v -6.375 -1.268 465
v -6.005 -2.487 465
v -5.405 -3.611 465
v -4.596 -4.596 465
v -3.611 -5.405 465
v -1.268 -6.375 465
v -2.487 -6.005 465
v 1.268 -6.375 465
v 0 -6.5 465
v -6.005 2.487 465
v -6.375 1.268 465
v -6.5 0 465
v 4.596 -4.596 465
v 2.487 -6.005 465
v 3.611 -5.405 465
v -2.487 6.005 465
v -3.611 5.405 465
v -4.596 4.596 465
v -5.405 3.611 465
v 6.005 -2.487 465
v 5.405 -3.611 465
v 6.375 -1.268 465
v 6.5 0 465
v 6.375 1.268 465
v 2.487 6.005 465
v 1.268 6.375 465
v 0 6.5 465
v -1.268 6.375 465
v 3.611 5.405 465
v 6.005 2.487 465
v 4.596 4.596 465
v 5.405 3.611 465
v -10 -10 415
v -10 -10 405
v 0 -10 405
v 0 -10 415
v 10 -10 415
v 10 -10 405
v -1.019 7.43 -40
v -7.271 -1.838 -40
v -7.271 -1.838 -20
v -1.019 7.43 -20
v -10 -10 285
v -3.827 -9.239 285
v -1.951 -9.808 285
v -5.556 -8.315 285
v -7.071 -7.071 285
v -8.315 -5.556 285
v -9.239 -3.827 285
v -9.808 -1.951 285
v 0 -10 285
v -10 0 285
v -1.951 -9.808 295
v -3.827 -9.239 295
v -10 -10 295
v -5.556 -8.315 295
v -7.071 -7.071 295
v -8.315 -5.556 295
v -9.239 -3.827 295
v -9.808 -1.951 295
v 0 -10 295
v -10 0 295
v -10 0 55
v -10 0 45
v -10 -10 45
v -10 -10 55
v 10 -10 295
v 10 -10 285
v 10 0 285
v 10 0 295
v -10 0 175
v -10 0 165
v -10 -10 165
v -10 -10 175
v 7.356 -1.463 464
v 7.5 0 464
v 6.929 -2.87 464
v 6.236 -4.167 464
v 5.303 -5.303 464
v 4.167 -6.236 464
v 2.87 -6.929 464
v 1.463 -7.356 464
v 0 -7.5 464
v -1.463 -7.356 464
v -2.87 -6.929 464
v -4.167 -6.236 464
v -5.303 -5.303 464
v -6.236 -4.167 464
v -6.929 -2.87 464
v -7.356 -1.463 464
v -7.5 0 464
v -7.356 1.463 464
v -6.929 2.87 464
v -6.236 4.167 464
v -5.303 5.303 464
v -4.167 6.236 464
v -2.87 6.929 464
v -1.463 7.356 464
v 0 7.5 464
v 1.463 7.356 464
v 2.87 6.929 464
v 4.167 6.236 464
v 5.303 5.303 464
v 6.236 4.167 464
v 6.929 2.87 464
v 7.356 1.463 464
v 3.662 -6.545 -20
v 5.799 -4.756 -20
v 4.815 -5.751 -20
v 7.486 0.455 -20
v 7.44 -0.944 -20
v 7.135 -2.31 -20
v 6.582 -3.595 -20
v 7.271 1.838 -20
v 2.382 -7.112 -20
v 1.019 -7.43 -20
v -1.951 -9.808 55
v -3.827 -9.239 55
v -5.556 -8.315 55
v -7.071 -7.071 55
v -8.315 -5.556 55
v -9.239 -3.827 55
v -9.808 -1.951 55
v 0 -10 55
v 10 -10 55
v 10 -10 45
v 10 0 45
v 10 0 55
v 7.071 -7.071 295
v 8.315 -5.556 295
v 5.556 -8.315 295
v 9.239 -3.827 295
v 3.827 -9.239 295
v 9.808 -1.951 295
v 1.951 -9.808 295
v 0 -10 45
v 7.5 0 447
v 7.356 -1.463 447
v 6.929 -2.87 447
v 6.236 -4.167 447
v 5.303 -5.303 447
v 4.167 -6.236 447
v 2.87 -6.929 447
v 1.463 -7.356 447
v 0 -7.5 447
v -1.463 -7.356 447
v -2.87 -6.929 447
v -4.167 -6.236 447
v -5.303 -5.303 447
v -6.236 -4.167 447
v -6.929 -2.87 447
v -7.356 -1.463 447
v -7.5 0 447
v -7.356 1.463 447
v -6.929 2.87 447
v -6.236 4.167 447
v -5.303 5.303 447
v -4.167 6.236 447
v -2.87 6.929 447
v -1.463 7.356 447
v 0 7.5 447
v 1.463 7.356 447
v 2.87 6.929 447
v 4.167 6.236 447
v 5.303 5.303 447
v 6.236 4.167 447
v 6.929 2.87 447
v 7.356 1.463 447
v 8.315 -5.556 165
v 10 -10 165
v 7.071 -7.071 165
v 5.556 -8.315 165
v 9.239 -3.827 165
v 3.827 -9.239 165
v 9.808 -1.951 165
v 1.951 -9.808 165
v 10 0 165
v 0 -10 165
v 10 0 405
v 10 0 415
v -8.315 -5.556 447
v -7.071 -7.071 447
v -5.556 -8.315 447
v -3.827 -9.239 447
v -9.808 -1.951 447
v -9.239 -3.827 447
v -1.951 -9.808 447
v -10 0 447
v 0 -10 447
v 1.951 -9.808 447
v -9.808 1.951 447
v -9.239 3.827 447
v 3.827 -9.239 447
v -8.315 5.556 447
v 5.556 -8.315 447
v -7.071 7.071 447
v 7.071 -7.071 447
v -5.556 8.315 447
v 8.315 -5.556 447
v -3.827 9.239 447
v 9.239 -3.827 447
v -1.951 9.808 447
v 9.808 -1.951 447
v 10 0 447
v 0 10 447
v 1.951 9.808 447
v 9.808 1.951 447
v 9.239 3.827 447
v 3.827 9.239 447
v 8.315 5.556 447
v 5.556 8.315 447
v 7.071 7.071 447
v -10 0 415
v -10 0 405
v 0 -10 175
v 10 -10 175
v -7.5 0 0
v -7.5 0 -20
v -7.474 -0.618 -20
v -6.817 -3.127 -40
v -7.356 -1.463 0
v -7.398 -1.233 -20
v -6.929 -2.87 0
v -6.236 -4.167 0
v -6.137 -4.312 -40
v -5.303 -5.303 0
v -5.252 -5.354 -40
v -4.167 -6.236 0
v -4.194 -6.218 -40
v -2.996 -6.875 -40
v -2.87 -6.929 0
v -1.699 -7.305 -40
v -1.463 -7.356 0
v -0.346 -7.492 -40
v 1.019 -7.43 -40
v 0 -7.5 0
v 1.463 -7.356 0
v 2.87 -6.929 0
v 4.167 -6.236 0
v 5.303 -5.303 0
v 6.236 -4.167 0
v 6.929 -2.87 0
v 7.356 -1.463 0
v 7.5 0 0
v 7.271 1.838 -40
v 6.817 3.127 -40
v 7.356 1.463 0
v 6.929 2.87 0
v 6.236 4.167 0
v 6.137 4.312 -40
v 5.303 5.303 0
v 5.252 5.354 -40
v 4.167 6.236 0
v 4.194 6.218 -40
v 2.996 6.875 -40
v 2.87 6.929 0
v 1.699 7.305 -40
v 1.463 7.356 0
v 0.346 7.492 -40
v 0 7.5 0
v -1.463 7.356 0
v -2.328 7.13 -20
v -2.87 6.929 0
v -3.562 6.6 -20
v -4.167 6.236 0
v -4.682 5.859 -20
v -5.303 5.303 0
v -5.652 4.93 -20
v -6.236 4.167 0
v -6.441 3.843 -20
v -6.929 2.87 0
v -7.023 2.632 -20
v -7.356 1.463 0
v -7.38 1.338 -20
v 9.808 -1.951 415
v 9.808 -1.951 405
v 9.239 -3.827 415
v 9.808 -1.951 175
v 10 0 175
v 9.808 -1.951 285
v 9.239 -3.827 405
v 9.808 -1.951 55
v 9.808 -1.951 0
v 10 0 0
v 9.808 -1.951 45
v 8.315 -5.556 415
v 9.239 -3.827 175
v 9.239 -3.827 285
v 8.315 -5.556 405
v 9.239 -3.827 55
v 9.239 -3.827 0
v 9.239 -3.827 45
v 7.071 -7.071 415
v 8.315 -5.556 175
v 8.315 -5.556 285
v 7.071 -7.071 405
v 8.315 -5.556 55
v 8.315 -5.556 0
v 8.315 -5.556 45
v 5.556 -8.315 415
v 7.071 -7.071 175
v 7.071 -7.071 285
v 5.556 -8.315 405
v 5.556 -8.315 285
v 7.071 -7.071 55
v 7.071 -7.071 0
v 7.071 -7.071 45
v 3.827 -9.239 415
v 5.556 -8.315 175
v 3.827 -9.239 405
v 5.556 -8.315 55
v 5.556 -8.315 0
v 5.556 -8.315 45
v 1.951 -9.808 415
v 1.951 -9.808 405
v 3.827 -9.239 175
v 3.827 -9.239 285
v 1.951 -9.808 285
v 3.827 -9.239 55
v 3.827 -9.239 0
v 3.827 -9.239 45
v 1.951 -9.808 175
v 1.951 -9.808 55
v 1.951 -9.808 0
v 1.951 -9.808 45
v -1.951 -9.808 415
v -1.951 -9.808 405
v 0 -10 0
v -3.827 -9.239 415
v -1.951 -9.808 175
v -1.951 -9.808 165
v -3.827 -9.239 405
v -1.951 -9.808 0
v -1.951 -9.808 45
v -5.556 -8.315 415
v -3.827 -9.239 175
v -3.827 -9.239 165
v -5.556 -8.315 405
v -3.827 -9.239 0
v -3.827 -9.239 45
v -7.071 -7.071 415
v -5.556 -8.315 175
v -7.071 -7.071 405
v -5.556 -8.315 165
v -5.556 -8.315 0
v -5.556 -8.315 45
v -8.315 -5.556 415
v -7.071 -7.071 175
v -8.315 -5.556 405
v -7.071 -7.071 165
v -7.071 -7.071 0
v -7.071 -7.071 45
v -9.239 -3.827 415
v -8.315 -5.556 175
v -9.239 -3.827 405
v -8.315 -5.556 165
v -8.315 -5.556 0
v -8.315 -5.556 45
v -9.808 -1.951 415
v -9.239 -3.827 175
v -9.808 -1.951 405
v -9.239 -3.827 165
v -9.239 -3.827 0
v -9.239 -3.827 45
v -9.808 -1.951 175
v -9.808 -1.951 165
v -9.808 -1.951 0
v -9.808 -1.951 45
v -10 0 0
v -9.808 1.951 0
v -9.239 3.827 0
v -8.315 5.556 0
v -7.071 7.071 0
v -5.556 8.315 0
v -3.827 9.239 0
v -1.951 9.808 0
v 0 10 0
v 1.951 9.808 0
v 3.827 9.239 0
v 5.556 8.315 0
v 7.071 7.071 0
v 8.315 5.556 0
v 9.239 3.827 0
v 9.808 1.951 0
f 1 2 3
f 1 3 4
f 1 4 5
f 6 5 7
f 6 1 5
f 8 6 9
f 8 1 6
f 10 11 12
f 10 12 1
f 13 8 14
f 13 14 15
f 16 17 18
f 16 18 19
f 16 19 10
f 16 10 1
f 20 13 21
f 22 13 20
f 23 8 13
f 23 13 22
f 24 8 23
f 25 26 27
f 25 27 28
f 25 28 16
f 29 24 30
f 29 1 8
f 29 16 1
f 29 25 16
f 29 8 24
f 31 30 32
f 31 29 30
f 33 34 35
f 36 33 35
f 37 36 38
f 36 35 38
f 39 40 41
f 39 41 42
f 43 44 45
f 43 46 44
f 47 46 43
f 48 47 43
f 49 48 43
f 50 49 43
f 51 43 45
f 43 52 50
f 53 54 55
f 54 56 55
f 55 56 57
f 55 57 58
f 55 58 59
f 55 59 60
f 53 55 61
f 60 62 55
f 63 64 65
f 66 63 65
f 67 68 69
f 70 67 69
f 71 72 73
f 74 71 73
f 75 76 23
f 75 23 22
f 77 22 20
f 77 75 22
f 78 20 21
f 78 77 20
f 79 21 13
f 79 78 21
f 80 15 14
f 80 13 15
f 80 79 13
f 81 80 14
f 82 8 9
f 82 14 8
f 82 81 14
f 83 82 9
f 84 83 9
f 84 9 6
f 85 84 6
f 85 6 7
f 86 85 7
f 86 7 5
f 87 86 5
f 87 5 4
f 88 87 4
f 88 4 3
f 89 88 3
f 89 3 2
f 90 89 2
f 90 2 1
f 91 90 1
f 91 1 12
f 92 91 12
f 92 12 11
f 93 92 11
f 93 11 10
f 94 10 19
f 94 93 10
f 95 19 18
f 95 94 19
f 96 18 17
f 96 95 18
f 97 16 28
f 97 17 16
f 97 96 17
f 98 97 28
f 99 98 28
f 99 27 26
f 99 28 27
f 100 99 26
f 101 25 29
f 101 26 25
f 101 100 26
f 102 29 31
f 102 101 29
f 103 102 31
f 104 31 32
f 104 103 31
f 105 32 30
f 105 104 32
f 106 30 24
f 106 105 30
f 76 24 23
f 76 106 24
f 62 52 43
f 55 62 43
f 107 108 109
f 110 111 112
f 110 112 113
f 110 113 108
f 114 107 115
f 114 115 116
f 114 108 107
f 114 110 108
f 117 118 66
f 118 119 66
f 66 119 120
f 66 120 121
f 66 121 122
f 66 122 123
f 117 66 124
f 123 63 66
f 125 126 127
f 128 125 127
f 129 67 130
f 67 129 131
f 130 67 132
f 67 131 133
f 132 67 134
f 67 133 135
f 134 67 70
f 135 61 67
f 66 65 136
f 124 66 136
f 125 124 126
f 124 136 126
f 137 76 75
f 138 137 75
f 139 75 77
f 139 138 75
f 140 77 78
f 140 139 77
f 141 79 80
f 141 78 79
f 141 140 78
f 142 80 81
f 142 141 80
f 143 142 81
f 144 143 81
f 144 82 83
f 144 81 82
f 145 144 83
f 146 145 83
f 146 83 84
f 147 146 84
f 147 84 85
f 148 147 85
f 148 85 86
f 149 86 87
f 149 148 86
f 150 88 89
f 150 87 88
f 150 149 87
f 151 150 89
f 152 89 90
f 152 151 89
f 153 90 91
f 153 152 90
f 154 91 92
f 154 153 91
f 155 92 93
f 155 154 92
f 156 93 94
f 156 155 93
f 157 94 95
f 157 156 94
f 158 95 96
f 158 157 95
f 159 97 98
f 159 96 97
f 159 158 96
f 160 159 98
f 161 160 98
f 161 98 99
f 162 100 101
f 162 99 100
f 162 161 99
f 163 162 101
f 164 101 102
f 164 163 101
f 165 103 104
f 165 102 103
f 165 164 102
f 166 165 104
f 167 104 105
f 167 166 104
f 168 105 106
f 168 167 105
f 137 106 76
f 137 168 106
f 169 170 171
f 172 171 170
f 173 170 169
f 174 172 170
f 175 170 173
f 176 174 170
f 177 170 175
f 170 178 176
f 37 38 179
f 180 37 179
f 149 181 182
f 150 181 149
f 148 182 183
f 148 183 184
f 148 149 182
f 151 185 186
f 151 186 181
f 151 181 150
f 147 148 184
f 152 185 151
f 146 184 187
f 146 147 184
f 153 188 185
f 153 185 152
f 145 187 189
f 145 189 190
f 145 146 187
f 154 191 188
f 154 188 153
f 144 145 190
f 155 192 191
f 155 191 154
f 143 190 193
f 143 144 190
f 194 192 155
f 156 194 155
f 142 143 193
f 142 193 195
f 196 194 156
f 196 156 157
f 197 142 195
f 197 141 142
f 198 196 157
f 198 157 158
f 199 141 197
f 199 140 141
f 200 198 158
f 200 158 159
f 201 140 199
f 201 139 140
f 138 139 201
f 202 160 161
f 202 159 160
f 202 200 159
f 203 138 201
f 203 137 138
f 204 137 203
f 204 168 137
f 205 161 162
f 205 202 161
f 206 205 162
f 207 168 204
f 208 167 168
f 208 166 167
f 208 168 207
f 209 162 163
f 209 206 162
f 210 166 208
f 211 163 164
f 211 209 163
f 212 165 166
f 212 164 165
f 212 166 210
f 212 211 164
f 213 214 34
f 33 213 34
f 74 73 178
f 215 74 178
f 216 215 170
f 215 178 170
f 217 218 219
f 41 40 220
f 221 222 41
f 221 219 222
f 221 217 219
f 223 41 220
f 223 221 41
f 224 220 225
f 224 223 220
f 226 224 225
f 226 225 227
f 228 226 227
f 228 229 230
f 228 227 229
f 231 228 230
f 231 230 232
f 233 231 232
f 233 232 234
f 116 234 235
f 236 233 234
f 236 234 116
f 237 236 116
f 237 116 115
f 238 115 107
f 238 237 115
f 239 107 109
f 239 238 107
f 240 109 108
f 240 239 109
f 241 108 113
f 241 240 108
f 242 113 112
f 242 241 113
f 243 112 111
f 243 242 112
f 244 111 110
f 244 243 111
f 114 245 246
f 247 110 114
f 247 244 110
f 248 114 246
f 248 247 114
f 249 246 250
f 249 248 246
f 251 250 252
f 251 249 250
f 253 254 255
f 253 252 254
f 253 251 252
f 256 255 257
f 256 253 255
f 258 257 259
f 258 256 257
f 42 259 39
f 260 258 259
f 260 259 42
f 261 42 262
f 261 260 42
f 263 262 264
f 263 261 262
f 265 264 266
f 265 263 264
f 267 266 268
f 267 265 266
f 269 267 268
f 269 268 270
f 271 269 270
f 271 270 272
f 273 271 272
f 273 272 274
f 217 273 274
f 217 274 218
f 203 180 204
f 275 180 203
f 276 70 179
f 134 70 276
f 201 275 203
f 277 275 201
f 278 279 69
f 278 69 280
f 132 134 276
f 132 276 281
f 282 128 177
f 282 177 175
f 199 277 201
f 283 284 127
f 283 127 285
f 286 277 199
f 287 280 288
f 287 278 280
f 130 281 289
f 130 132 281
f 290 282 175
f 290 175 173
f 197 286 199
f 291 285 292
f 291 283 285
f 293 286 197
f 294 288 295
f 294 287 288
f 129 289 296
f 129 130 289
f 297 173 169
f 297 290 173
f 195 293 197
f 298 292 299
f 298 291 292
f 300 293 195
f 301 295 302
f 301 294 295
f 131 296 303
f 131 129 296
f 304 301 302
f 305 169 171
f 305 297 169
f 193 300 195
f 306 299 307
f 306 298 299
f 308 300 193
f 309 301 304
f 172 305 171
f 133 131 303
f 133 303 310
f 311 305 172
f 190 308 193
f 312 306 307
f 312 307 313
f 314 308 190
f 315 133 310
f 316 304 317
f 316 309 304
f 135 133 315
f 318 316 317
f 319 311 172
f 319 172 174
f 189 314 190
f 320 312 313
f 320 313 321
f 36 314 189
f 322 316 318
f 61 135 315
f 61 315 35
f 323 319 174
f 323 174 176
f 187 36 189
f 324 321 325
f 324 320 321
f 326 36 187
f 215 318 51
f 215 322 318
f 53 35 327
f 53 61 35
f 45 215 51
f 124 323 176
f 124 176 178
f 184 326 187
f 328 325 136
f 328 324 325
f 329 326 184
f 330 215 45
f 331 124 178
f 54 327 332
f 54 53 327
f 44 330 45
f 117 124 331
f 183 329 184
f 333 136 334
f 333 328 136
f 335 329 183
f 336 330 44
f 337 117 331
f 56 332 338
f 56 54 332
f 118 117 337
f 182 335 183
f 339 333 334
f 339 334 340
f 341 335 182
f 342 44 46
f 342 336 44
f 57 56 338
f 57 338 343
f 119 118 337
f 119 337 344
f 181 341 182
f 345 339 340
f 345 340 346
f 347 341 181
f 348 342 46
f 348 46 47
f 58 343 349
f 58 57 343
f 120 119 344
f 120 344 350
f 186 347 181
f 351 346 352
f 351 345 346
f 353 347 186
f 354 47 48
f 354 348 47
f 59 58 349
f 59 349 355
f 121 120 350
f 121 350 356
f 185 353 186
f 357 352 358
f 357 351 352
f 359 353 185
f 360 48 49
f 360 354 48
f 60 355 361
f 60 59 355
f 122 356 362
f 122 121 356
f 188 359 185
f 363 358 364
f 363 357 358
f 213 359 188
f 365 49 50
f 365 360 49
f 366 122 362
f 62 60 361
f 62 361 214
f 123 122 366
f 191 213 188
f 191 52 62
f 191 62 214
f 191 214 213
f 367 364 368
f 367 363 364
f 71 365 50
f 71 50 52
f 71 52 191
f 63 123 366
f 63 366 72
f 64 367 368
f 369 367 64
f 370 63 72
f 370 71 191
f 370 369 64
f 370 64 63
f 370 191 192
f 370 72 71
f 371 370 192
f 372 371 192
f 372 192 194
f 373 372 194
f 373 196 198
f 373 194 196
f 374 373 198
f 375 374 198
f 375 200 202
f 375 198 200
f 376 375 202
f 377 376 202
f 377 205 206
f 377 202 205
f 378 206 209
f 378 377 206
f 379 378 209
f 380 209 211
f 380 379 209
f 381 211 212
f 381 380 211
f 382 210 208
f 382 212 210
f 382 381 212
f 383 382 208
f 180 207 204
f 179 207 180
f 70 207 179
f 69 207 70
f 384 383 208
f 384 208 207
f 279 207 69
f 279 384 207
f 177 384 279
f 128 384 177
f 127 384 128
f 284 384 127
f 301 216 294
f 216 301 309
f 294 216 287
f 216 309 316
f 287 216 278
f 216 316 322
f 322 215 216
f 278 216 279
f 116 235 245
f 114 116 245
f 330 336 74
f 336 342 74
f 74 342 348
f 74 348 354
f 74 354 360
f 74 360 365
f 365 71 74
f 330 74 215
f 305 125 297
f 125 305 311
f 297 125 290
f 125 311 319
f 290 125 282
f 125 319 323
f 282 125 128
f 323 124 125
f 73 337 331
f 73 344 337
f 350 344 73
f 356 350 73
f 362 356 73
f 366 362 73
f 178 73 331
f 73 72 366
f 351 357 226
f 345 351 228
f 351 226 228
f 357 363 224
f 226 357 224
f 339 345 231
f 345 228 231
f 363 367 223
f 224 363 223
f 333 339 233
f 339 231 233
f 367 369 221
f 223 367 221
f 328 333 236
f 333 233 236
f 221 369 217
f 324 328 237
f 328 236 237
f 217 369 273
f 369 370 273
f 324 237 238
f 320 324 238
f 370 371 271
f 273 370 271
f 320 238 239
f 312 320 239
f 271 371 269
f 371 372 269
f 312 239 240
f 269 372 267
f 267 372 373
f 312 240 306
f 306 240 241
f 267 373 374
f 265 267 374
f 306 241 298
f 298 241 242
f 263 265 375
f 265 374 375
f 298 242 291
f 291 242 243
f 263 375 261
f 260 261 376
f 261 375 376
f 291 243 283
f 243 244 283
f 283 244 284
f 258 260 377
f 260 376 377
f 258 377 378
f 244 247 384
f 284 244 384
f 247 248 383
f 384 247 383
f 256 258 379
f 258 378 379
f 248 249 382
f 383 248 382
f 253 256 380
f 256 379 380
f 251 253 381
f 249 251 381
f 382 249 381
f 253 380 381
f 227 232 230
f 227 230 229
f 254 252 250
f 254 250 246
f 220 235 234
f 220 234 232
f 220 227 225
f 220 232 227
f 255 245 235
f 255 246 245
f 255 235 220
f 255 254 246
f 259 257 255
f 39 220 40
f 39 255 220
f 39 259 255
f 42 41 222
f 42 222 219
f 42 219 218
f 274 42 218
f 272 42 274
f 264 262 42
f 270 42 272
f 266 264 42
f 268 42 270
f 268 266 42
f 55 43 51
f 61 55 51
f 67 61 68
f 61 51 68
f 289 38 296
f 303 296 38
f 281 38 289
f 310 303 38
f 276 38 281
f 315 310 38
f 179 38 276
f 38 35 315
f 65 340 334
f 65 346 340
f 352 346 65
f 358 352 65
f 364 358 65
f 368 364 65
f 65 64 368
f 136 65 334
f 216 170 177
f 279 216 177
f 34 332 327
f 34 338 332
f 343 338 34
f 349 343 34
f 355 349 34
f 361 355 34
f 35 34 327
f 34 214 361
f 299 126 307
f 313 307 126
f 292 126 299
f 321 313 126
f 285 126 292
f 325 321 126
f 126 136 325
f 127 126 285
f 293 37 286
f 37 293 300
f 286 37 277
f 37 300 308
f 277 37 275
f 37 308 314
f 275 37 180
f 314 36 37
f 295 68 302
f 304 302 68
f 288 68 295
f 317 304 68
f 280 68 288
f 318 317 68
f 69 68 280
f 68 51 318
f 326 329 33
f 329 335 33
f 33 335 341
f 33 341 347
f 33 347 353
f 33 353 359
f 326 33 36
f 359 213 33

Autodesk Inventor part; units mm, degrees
ref_plane "YZ Plane" through (0, 0, 0) normal (1, 0, 0) x (0, 1, 0)
ref_plane "XZ Plane" through (0, 0, 0) normal (0, 1, 0) x (-1, 0, 0)
sketch "草图1" plane through (0, 0, 0) normal (0, 0, 1) x (1, 0, 0)
  circle A0 centre (0, 0) radius 10
  dimension "d0" = 20
extrude "拉伸1" add sketch "草图1" along normal blind 447
sketch "草图2" plane through (0, 0, 447) normal (0, 0, 1) x (1, 0, 0)
  circle A0 centre (0, 0) radius 7.5
  dimension "d3" = 15
extrude "拉伸2" add sketch "草图2" along normal blind 18
chamfer "倒角1" distance 1 angle 45 1 edges at (-7.5, 0, 465)
sketch "草图3" plane through (0, 0, 0) normal (0, 0, -1) x (-1, 0, 0)
  circle A0 centre (0, 0) radius 7.5
  dimension "d9" = 15
extrude "拉伸3" add sketch "草图3" along normal blind 40
ref_plane "工作平面1" through (0, 0, 45) normal (0, 0, -1) x (-1, 0, 0)
sketch "草图4" plane through (0, 0, 45) normal (0, 0, -1) x (-1, 0, 0)
  circle A0 centre (0, 0) radius 10
  circle A1 centre (0, 0) radius 10 projected
  line L0 (0, 10) -> (10, 10)
  line L1 (10, 0) -> (10, -10)
  line L2 (10, -10) -> (-10, -10)
  line L3 (-10, -10) -> (-10, 0)
  dimension "d13" = 20
  dimension "d14" = 20
  dimension "d15" = 10
  dimension "d16" = 10
extrude "拉伸4" add sketch "草图4" against normal blind 10 contours L1 L2 A0 | L2 L3 A0
pattern_linear "矩形阵列1" count 4 spacing 120 along (0, 0, 1) of "拉伸4"
sketch "草图5" plane through (0, 0, -40) normal (0, 0, -1) x (-1, 0, 0)
  circle A0 centre (0, 0) radius 7.5
  line L0 (7.2712, -1.8385) -> (1.0192, 7.4304)
  line L1 (-1.0192, -7.4304) -> (-7.2712, 1.8385)
  line L2 (-10, -10) -> (0, -10) projected
  dimension "d22" = 15
  dimension "d23" = 10
  dimension "d24" = 56
extrude "拉伸5" cut sketch "草图5" against normal blind 20 contours A0 L0 | L1 A0
properties part number "刀轴"
